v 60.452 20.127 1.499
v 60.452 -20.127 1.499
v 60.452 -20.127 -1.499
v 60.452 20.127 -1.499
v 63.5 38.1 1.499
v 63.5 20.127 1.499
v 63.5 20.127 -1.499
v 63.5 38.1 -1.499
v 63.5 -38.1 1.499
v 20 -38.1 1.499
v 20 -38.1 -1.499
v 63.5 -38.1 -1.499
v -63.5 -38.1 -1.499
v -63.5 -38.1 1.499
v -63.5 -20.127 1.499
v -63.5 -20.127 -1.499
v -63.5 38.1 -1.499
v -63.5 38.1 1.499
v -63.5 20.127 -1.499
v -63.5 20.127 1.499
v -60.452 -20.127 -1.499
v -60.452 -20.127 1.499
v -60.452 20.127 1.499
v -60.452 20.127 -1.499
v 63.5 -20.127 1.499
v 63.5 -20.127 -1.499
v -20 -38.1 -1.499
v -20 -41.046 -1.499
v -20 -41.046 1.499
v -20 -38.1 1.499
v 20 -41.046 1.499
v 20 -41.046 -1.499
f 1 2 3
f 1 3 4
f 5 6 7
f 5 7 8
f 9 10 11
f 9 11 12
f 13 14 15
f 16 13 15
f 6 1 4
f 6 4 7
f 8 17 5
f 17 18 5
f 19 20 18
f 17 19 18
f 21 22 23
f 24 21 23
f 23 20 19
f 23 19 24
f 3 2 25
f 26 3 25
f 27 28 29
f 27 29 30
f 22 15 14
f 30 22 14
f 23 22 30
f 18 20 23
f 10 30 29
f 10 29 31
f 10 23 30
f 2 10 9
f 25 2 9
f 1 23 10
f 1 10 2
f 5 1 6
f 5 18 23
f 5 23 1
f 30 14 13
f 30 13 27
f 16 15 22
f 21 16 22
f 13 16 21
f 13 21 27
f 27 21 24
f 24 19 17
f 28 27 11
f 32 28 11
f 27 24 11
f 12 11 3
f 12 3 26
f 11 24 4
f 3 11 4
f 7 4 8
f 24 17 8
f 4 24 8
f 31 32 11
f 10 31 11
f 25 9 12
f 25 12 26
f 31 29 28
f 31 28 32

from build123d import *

# Parameters (mm, degrees)
SKETCH1_W           = 127
SKETCH1_H           = 76.2
BOSS_EXTRUDE1_DEPTH = 1.4986
SKETCH2_W           = 3.048
SKETCH2_H           = 40.254
SKETCH2_W_2         = 40.254
SKETCH2_H_2         = 2.9464
CUT_EXTRUDE1_DEPTH  = 3.9972
SKETCH3_W           = 40
SKETCH3_H           = 2.9464
BOSS_EXTRUDE2_DEPTH = 2.9972


with BuildPart() as part:
    # Sketch1 → Boss-Extrude1 (new body, symmetric)
    with BuildSketch(Plane.XY):
        Rectangle(SKETCH1_W, SKETCH1_H)
    extrude(amount=BOSS_EXTRUDE1_DEPTH, both=True)

    # Sketch2 → Cut-Extrude1 (cut, through all)
    with BuildSketch(Plane.XY.offset(1.4986)):
        with Locations((-61.976, 0)):
            Rectangle(SKETCH2_W, SKETCH2_H)
        with Locations((61.976, 0)):
            Rectangle(SKETCH2_W, SKETCH2_H)
        with Locations((0, -39.5732)):
            Rectangle(SKETCH2_W_2, SKETCH2_H_2)
    extrude(amount=-CUT_EXTRUDE1_DEPTH, mode=Mode.SUBTRACT)

    # Sketch3 → Boss-Extrude2 (add, through all)
    with BuildSketch(Plane.XY.offset(1.4986)):
        with Locations((0, -39.5732)):
            Rectangle(SKETCH3_W, SKETCH3_H)
    extrude(amount=-BOSS_EXTRUDE2_DEPTH)


solid = part.part
